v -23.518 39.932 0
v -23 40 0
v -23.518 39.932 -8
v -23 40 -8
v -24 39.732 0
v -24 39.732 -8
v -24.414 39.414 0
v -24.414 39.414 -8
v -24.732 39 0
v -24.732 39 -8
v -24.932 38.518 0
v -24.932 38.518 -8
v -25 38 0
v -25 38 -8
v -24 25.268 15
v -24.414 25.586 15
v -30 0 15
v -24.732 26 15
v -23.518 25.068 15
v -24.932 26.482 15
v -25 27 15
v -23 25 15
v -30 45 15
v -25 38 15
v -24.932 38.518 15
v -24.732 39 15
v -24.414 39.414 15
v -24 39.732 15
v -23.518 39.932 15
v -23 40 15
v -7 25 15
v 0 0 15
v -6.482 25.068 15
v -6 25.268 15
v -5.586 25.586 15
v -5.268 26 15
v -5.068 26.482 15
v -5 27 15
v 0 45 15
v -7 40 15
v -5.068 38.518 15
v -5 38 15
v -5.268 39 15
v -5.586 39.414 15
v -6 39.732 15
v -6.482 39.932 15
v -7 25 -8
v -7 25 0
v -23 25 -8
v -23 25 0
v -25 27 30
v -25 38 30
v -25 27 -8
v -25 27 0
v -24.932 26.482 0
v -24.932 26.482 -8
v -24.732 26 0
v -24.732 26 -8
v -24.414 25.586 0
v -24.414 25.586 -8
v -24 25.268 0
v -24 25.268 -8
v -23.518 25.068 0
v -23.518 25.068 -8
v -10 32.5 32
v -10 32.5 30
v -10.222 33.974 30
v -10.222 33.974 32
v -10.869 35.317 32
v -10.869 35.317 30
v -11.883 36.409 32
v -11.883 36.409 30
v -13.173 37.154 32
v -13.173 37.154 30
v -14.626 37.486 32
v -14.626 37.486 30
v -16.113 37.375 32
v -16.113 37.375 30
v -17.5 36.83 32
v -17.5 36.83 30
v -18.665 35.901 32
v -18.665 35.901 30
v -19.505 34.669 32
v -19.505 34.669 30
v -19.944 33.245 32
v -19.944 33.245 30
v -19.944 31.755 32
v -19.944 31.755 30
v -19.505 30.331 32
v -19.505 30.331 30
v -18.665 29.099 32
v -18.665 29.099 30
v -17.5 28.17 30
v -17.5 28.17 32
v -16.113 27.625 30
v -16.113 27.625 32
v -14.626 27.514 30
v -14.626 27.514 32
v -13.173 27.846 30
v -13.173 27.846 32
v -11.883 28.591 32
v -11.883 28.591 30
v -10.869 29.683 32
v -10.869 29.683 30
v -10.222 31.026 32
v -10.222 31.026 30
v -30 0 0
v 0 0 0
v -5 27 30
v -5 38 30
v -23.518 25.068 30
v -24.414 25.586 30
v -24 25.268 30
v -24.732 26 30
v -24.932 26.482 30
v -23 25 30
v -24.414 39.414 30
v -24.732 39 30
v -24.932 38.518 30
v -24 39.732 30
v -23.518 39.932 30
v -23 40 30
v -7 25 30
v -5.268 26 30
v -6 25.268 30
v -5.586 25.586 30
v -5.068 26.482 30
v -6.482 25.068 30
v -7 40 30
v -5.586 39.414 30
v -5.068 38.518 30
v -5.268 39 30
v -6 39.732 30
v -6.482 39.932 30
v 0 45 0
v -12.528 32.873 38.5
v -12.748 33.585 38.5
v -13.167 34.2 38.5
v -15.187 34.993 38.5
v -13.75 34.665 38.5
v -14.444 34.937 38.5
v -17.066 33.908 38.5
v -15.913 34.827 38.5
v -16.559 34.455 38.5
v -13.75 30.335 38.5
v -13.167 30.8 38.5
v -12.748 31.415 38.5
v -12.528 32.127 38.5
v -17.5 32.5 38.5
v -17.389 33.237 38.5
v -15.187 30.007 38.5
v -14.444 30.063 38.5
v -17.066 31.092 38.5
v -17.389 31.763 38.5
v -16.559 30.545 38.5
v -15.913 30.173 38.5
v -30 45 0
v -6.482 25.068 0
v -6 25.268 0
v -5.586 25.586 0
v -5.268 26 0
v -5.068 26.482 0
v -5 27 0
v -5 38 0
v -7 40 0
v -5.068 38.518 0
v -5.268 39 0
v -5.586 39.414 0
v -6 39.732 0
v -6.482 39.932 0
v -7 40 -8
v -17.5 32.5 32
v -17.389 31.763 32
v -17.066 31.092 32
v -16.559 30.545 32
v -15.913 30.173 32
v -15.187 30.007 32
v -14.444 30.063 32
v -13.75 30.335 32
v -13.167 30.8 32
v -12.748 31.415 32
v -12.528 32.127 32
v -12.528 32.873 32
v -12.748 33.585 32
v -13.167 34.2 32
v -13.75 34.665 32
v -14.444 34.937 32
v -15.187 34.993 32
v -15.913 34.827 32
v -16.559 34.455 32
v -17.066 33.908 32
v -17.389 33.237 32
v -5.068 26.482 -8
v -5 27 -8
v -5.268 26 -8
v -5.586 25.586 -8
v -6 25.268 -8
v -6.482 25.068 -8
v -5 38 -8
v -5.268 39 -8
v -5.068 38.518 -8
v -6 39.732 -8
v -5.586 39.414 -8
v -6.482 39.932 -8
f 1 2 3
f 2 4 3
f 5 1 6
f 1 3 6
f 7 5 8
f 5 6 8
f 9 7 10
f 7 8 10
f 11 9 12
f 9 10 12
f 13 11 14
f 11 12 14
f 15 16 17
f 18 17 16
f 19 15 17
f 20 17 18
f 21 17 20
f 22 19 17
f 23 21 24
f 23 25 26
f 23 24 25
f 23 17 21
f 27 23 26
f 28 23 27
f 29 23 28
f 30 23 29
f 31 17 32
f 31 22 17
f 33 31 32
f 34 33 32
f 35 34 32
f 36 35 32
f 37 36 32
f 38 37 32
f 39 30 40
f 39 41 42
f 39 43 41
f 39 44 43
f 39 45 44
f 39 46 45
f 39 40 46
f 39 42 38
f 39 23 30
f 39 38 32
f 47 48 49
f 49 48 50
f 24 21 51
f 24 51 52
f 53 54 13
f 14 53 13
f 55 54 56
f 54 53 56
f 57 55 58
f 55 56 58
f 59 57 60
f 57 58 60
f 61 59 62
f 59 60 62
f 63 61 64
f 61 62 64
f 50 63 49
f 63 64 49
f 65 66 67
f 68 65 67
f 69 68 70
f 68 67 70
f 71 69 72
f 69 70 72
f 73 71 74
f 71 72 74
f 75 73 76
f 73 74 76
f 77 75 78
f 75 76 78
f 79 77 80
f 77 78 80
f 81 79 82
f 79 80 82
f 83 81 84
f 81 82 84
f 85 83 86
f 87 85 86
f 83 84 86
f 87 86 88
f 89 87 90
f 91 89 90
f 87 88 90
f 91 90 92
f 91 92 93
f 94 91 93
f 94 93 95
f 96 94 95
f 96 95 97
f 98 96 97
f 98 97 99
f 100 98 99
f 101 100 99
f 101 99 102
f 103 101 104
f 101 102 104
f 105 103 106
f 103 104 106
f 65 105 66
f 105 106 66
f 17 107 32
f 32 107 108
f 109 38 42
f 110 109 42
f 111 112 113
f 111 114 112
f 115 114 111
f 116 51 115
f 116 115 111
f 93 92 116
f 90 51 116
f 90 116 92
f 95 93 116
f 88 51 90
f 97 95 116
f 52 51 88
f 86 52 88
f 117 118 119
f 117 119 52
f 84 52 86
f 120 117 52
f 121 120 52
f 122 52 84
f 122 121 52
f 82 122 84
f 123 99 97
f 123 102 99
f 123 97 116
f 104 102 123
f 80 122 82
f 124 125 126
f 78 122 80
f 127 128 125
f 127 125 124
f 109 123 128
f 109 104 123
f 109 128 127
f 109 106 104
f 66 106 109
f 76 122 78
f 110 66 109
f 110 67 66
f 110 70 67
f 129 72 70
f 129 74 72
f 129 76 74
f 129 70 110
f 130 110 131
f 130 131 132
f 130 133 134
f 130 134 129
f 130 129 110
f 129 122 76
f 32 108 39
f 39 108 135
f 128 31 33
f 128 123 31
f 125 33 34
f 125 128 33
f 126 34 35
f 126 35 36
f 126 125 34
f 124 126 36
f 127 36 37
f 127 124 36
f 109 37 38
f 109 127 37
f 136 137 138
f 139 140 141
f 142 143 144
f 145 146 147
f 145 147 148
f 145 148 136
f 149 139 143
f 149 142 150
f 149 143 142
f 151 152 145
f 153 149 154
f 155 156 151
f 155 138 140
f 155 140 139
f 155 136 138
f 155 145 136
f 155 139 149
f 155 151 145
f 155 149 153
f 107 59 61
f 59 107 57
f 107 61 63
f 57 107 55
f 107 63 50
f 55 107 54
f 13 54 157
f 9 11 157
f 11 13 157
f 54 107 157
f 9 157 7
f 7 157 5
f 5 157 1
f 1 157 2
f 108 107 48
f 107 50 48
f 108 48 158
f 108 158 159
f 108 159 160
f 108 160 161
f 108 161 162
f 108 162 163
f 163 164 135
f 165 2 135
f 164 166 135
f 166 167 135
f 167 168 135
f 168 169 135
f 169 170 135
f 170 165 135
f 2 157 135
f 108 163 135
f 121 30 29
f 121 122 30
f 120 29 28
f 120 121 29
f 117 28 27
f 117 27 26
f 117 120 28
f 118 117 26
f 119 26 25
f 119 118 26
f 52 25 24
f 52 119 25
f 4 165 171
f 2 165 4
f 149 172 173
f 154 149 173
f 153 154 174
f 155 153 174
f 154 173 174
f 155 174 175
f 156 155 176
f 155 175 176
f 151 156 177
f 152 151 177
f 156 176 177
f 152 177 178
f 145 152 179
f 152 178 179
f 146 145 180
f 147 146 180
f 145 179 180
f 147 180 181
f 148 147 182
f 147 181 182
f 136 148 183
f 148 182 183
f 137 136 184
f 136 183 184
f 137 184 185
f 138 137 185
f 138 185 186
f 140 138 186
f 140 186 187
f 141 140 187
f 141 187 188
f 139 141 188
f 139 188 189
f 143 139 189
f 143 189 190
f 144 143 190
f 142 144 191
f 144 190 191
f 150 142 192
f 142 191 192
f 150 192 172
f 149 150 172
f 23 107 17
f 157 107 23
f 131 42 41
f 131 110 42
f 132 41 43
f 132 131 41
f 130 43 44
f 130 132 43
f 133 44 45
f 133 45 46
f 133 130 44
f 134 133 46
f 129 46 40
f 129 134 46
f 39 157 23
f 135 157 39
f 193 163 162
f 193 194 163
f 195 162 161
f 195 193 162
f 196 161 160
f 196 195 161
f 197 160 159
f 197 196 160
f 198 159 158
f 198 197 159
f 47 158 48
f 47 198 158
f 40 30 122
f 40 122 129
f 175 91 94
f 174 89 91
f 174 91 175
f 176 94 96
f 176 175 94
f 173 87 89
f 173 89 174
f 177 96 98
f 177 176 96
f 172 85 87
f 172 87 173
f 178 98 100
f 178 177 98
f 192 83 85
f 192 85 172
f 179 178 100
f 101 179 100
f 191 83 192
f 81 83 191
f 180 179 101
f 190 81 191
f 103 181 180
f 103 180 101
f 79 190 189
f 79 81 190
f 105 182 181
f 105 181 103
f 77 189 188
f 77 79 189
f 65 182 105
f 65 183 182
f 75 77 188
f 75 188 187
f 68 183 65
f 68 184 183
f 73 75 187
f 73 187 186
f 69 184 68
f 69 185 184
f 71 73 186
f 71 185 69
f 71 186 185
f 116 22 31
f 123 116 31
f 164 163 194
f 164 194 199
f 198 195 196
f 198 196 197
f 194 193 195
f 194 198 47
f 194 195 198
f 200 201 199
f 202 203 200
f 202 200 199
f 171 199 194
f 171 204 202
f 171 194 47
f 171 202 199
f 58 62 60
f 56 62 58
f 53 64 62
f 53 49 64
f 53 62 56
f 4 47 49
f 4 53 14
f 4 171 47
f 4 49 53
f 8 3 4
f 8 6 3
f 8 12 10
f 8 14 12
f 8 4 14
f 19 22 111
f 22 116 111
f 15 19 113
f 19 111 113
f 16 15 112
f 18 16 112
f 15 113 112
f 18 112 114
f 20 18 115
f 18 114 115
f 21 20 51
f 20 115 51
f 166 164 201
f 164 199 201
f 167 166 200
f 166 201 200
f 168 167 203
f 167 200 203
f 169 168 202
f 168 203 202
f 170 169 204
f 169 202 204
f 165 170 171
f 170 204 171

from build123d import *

# Parameters (mm, degrees)
SKETCH3_W           = 30
SKETCH3_H           = 45
BOSS_EXTRUDE1_DEPTH = 15
SKETCH4_W           = 20
SKETCH4_H           = 15
BOSS_EXTRUDE2_DEPTH = 15
SKETCH5_W           = 20
SKETCH5_H           = 15
BOSS_EXTRUDE3_DEPTH = 8
FILLET1_R           = 2
SKETCH6_R           = 5
BOSS_EXTRUDE4_DEPTH = 2
SKETCH7_R           = 2.5
BOSS_EXTRUDE5_DEPTH = 6.5


with BuildPart() as part:
    # Sketch3 → Boss-Extrude1 (new body)
    with BuildSketch(Plane.XY):
        with Locations((-15, 22.5)):
            Rectangle(SKETCH3_W, SKETCH3_H)
    extrude(amount=BOSS_EXTRUDE1_DEPTH)

    # Sketch4 → Boss-Extrude2 (add)
    with BuildSketch(Plane.XY.offset(15)):
        with Locations((-15, 32.5)):
            Rectangle(SKETCH4_W, SKETCH4_H)
    extrude(amount=BOSS_EXTRUDE2_DEPTH)

    # Sketch5 → Boss-Extrude3 (add)
    with BuildSketch(Plane(origin=(0, 0, 0), x_dir=(-1, 0, 0), z_dir=(0, 0, -1))):
        with Locations((15, 32.5)):
            Rectangle(SKETCH5_W, SKETCH5_H)
    extrude(amount=BOSS_EXTRUDE3_DEPTH)

    # Fillet1
    fillet1_edges = [part.edges().sort_by_distance(p)[0] for p in [
        (-25, 40, 22.5),
        (-25, 25, 22.5),
        (-5, 25, 22.5),
        (-5, 40, 22.5),
        (-5, 40, -4),
        (-5, 25, -4),
        (-25, 25, -4),
        (-25, 40, -4),
    ]]
    fillet(fillet1_edges, radius=FILLET1_R)

    # Sketch6 → Boss-Extrude4 (add)
    with BuildSketch(Plane.XY.offset(30)):
        with Locations((-15, 32.5)):
            Circle(SKETCH6_R)
    extrude(amount=BOSS_EXTRUDE4_DEPTH)

    # Sketch7 → Boss-Extrude5 (add)
    with BuildSketch(Plane.XY.offset(32)):
        with Locations(Location((-15, 32.5, 0), (0, 0, 180))):
            Circle(SKETCH7_R)
    extrude(amount=BOSS_EXTRUDE5_DEPTH)


solid = part.part
